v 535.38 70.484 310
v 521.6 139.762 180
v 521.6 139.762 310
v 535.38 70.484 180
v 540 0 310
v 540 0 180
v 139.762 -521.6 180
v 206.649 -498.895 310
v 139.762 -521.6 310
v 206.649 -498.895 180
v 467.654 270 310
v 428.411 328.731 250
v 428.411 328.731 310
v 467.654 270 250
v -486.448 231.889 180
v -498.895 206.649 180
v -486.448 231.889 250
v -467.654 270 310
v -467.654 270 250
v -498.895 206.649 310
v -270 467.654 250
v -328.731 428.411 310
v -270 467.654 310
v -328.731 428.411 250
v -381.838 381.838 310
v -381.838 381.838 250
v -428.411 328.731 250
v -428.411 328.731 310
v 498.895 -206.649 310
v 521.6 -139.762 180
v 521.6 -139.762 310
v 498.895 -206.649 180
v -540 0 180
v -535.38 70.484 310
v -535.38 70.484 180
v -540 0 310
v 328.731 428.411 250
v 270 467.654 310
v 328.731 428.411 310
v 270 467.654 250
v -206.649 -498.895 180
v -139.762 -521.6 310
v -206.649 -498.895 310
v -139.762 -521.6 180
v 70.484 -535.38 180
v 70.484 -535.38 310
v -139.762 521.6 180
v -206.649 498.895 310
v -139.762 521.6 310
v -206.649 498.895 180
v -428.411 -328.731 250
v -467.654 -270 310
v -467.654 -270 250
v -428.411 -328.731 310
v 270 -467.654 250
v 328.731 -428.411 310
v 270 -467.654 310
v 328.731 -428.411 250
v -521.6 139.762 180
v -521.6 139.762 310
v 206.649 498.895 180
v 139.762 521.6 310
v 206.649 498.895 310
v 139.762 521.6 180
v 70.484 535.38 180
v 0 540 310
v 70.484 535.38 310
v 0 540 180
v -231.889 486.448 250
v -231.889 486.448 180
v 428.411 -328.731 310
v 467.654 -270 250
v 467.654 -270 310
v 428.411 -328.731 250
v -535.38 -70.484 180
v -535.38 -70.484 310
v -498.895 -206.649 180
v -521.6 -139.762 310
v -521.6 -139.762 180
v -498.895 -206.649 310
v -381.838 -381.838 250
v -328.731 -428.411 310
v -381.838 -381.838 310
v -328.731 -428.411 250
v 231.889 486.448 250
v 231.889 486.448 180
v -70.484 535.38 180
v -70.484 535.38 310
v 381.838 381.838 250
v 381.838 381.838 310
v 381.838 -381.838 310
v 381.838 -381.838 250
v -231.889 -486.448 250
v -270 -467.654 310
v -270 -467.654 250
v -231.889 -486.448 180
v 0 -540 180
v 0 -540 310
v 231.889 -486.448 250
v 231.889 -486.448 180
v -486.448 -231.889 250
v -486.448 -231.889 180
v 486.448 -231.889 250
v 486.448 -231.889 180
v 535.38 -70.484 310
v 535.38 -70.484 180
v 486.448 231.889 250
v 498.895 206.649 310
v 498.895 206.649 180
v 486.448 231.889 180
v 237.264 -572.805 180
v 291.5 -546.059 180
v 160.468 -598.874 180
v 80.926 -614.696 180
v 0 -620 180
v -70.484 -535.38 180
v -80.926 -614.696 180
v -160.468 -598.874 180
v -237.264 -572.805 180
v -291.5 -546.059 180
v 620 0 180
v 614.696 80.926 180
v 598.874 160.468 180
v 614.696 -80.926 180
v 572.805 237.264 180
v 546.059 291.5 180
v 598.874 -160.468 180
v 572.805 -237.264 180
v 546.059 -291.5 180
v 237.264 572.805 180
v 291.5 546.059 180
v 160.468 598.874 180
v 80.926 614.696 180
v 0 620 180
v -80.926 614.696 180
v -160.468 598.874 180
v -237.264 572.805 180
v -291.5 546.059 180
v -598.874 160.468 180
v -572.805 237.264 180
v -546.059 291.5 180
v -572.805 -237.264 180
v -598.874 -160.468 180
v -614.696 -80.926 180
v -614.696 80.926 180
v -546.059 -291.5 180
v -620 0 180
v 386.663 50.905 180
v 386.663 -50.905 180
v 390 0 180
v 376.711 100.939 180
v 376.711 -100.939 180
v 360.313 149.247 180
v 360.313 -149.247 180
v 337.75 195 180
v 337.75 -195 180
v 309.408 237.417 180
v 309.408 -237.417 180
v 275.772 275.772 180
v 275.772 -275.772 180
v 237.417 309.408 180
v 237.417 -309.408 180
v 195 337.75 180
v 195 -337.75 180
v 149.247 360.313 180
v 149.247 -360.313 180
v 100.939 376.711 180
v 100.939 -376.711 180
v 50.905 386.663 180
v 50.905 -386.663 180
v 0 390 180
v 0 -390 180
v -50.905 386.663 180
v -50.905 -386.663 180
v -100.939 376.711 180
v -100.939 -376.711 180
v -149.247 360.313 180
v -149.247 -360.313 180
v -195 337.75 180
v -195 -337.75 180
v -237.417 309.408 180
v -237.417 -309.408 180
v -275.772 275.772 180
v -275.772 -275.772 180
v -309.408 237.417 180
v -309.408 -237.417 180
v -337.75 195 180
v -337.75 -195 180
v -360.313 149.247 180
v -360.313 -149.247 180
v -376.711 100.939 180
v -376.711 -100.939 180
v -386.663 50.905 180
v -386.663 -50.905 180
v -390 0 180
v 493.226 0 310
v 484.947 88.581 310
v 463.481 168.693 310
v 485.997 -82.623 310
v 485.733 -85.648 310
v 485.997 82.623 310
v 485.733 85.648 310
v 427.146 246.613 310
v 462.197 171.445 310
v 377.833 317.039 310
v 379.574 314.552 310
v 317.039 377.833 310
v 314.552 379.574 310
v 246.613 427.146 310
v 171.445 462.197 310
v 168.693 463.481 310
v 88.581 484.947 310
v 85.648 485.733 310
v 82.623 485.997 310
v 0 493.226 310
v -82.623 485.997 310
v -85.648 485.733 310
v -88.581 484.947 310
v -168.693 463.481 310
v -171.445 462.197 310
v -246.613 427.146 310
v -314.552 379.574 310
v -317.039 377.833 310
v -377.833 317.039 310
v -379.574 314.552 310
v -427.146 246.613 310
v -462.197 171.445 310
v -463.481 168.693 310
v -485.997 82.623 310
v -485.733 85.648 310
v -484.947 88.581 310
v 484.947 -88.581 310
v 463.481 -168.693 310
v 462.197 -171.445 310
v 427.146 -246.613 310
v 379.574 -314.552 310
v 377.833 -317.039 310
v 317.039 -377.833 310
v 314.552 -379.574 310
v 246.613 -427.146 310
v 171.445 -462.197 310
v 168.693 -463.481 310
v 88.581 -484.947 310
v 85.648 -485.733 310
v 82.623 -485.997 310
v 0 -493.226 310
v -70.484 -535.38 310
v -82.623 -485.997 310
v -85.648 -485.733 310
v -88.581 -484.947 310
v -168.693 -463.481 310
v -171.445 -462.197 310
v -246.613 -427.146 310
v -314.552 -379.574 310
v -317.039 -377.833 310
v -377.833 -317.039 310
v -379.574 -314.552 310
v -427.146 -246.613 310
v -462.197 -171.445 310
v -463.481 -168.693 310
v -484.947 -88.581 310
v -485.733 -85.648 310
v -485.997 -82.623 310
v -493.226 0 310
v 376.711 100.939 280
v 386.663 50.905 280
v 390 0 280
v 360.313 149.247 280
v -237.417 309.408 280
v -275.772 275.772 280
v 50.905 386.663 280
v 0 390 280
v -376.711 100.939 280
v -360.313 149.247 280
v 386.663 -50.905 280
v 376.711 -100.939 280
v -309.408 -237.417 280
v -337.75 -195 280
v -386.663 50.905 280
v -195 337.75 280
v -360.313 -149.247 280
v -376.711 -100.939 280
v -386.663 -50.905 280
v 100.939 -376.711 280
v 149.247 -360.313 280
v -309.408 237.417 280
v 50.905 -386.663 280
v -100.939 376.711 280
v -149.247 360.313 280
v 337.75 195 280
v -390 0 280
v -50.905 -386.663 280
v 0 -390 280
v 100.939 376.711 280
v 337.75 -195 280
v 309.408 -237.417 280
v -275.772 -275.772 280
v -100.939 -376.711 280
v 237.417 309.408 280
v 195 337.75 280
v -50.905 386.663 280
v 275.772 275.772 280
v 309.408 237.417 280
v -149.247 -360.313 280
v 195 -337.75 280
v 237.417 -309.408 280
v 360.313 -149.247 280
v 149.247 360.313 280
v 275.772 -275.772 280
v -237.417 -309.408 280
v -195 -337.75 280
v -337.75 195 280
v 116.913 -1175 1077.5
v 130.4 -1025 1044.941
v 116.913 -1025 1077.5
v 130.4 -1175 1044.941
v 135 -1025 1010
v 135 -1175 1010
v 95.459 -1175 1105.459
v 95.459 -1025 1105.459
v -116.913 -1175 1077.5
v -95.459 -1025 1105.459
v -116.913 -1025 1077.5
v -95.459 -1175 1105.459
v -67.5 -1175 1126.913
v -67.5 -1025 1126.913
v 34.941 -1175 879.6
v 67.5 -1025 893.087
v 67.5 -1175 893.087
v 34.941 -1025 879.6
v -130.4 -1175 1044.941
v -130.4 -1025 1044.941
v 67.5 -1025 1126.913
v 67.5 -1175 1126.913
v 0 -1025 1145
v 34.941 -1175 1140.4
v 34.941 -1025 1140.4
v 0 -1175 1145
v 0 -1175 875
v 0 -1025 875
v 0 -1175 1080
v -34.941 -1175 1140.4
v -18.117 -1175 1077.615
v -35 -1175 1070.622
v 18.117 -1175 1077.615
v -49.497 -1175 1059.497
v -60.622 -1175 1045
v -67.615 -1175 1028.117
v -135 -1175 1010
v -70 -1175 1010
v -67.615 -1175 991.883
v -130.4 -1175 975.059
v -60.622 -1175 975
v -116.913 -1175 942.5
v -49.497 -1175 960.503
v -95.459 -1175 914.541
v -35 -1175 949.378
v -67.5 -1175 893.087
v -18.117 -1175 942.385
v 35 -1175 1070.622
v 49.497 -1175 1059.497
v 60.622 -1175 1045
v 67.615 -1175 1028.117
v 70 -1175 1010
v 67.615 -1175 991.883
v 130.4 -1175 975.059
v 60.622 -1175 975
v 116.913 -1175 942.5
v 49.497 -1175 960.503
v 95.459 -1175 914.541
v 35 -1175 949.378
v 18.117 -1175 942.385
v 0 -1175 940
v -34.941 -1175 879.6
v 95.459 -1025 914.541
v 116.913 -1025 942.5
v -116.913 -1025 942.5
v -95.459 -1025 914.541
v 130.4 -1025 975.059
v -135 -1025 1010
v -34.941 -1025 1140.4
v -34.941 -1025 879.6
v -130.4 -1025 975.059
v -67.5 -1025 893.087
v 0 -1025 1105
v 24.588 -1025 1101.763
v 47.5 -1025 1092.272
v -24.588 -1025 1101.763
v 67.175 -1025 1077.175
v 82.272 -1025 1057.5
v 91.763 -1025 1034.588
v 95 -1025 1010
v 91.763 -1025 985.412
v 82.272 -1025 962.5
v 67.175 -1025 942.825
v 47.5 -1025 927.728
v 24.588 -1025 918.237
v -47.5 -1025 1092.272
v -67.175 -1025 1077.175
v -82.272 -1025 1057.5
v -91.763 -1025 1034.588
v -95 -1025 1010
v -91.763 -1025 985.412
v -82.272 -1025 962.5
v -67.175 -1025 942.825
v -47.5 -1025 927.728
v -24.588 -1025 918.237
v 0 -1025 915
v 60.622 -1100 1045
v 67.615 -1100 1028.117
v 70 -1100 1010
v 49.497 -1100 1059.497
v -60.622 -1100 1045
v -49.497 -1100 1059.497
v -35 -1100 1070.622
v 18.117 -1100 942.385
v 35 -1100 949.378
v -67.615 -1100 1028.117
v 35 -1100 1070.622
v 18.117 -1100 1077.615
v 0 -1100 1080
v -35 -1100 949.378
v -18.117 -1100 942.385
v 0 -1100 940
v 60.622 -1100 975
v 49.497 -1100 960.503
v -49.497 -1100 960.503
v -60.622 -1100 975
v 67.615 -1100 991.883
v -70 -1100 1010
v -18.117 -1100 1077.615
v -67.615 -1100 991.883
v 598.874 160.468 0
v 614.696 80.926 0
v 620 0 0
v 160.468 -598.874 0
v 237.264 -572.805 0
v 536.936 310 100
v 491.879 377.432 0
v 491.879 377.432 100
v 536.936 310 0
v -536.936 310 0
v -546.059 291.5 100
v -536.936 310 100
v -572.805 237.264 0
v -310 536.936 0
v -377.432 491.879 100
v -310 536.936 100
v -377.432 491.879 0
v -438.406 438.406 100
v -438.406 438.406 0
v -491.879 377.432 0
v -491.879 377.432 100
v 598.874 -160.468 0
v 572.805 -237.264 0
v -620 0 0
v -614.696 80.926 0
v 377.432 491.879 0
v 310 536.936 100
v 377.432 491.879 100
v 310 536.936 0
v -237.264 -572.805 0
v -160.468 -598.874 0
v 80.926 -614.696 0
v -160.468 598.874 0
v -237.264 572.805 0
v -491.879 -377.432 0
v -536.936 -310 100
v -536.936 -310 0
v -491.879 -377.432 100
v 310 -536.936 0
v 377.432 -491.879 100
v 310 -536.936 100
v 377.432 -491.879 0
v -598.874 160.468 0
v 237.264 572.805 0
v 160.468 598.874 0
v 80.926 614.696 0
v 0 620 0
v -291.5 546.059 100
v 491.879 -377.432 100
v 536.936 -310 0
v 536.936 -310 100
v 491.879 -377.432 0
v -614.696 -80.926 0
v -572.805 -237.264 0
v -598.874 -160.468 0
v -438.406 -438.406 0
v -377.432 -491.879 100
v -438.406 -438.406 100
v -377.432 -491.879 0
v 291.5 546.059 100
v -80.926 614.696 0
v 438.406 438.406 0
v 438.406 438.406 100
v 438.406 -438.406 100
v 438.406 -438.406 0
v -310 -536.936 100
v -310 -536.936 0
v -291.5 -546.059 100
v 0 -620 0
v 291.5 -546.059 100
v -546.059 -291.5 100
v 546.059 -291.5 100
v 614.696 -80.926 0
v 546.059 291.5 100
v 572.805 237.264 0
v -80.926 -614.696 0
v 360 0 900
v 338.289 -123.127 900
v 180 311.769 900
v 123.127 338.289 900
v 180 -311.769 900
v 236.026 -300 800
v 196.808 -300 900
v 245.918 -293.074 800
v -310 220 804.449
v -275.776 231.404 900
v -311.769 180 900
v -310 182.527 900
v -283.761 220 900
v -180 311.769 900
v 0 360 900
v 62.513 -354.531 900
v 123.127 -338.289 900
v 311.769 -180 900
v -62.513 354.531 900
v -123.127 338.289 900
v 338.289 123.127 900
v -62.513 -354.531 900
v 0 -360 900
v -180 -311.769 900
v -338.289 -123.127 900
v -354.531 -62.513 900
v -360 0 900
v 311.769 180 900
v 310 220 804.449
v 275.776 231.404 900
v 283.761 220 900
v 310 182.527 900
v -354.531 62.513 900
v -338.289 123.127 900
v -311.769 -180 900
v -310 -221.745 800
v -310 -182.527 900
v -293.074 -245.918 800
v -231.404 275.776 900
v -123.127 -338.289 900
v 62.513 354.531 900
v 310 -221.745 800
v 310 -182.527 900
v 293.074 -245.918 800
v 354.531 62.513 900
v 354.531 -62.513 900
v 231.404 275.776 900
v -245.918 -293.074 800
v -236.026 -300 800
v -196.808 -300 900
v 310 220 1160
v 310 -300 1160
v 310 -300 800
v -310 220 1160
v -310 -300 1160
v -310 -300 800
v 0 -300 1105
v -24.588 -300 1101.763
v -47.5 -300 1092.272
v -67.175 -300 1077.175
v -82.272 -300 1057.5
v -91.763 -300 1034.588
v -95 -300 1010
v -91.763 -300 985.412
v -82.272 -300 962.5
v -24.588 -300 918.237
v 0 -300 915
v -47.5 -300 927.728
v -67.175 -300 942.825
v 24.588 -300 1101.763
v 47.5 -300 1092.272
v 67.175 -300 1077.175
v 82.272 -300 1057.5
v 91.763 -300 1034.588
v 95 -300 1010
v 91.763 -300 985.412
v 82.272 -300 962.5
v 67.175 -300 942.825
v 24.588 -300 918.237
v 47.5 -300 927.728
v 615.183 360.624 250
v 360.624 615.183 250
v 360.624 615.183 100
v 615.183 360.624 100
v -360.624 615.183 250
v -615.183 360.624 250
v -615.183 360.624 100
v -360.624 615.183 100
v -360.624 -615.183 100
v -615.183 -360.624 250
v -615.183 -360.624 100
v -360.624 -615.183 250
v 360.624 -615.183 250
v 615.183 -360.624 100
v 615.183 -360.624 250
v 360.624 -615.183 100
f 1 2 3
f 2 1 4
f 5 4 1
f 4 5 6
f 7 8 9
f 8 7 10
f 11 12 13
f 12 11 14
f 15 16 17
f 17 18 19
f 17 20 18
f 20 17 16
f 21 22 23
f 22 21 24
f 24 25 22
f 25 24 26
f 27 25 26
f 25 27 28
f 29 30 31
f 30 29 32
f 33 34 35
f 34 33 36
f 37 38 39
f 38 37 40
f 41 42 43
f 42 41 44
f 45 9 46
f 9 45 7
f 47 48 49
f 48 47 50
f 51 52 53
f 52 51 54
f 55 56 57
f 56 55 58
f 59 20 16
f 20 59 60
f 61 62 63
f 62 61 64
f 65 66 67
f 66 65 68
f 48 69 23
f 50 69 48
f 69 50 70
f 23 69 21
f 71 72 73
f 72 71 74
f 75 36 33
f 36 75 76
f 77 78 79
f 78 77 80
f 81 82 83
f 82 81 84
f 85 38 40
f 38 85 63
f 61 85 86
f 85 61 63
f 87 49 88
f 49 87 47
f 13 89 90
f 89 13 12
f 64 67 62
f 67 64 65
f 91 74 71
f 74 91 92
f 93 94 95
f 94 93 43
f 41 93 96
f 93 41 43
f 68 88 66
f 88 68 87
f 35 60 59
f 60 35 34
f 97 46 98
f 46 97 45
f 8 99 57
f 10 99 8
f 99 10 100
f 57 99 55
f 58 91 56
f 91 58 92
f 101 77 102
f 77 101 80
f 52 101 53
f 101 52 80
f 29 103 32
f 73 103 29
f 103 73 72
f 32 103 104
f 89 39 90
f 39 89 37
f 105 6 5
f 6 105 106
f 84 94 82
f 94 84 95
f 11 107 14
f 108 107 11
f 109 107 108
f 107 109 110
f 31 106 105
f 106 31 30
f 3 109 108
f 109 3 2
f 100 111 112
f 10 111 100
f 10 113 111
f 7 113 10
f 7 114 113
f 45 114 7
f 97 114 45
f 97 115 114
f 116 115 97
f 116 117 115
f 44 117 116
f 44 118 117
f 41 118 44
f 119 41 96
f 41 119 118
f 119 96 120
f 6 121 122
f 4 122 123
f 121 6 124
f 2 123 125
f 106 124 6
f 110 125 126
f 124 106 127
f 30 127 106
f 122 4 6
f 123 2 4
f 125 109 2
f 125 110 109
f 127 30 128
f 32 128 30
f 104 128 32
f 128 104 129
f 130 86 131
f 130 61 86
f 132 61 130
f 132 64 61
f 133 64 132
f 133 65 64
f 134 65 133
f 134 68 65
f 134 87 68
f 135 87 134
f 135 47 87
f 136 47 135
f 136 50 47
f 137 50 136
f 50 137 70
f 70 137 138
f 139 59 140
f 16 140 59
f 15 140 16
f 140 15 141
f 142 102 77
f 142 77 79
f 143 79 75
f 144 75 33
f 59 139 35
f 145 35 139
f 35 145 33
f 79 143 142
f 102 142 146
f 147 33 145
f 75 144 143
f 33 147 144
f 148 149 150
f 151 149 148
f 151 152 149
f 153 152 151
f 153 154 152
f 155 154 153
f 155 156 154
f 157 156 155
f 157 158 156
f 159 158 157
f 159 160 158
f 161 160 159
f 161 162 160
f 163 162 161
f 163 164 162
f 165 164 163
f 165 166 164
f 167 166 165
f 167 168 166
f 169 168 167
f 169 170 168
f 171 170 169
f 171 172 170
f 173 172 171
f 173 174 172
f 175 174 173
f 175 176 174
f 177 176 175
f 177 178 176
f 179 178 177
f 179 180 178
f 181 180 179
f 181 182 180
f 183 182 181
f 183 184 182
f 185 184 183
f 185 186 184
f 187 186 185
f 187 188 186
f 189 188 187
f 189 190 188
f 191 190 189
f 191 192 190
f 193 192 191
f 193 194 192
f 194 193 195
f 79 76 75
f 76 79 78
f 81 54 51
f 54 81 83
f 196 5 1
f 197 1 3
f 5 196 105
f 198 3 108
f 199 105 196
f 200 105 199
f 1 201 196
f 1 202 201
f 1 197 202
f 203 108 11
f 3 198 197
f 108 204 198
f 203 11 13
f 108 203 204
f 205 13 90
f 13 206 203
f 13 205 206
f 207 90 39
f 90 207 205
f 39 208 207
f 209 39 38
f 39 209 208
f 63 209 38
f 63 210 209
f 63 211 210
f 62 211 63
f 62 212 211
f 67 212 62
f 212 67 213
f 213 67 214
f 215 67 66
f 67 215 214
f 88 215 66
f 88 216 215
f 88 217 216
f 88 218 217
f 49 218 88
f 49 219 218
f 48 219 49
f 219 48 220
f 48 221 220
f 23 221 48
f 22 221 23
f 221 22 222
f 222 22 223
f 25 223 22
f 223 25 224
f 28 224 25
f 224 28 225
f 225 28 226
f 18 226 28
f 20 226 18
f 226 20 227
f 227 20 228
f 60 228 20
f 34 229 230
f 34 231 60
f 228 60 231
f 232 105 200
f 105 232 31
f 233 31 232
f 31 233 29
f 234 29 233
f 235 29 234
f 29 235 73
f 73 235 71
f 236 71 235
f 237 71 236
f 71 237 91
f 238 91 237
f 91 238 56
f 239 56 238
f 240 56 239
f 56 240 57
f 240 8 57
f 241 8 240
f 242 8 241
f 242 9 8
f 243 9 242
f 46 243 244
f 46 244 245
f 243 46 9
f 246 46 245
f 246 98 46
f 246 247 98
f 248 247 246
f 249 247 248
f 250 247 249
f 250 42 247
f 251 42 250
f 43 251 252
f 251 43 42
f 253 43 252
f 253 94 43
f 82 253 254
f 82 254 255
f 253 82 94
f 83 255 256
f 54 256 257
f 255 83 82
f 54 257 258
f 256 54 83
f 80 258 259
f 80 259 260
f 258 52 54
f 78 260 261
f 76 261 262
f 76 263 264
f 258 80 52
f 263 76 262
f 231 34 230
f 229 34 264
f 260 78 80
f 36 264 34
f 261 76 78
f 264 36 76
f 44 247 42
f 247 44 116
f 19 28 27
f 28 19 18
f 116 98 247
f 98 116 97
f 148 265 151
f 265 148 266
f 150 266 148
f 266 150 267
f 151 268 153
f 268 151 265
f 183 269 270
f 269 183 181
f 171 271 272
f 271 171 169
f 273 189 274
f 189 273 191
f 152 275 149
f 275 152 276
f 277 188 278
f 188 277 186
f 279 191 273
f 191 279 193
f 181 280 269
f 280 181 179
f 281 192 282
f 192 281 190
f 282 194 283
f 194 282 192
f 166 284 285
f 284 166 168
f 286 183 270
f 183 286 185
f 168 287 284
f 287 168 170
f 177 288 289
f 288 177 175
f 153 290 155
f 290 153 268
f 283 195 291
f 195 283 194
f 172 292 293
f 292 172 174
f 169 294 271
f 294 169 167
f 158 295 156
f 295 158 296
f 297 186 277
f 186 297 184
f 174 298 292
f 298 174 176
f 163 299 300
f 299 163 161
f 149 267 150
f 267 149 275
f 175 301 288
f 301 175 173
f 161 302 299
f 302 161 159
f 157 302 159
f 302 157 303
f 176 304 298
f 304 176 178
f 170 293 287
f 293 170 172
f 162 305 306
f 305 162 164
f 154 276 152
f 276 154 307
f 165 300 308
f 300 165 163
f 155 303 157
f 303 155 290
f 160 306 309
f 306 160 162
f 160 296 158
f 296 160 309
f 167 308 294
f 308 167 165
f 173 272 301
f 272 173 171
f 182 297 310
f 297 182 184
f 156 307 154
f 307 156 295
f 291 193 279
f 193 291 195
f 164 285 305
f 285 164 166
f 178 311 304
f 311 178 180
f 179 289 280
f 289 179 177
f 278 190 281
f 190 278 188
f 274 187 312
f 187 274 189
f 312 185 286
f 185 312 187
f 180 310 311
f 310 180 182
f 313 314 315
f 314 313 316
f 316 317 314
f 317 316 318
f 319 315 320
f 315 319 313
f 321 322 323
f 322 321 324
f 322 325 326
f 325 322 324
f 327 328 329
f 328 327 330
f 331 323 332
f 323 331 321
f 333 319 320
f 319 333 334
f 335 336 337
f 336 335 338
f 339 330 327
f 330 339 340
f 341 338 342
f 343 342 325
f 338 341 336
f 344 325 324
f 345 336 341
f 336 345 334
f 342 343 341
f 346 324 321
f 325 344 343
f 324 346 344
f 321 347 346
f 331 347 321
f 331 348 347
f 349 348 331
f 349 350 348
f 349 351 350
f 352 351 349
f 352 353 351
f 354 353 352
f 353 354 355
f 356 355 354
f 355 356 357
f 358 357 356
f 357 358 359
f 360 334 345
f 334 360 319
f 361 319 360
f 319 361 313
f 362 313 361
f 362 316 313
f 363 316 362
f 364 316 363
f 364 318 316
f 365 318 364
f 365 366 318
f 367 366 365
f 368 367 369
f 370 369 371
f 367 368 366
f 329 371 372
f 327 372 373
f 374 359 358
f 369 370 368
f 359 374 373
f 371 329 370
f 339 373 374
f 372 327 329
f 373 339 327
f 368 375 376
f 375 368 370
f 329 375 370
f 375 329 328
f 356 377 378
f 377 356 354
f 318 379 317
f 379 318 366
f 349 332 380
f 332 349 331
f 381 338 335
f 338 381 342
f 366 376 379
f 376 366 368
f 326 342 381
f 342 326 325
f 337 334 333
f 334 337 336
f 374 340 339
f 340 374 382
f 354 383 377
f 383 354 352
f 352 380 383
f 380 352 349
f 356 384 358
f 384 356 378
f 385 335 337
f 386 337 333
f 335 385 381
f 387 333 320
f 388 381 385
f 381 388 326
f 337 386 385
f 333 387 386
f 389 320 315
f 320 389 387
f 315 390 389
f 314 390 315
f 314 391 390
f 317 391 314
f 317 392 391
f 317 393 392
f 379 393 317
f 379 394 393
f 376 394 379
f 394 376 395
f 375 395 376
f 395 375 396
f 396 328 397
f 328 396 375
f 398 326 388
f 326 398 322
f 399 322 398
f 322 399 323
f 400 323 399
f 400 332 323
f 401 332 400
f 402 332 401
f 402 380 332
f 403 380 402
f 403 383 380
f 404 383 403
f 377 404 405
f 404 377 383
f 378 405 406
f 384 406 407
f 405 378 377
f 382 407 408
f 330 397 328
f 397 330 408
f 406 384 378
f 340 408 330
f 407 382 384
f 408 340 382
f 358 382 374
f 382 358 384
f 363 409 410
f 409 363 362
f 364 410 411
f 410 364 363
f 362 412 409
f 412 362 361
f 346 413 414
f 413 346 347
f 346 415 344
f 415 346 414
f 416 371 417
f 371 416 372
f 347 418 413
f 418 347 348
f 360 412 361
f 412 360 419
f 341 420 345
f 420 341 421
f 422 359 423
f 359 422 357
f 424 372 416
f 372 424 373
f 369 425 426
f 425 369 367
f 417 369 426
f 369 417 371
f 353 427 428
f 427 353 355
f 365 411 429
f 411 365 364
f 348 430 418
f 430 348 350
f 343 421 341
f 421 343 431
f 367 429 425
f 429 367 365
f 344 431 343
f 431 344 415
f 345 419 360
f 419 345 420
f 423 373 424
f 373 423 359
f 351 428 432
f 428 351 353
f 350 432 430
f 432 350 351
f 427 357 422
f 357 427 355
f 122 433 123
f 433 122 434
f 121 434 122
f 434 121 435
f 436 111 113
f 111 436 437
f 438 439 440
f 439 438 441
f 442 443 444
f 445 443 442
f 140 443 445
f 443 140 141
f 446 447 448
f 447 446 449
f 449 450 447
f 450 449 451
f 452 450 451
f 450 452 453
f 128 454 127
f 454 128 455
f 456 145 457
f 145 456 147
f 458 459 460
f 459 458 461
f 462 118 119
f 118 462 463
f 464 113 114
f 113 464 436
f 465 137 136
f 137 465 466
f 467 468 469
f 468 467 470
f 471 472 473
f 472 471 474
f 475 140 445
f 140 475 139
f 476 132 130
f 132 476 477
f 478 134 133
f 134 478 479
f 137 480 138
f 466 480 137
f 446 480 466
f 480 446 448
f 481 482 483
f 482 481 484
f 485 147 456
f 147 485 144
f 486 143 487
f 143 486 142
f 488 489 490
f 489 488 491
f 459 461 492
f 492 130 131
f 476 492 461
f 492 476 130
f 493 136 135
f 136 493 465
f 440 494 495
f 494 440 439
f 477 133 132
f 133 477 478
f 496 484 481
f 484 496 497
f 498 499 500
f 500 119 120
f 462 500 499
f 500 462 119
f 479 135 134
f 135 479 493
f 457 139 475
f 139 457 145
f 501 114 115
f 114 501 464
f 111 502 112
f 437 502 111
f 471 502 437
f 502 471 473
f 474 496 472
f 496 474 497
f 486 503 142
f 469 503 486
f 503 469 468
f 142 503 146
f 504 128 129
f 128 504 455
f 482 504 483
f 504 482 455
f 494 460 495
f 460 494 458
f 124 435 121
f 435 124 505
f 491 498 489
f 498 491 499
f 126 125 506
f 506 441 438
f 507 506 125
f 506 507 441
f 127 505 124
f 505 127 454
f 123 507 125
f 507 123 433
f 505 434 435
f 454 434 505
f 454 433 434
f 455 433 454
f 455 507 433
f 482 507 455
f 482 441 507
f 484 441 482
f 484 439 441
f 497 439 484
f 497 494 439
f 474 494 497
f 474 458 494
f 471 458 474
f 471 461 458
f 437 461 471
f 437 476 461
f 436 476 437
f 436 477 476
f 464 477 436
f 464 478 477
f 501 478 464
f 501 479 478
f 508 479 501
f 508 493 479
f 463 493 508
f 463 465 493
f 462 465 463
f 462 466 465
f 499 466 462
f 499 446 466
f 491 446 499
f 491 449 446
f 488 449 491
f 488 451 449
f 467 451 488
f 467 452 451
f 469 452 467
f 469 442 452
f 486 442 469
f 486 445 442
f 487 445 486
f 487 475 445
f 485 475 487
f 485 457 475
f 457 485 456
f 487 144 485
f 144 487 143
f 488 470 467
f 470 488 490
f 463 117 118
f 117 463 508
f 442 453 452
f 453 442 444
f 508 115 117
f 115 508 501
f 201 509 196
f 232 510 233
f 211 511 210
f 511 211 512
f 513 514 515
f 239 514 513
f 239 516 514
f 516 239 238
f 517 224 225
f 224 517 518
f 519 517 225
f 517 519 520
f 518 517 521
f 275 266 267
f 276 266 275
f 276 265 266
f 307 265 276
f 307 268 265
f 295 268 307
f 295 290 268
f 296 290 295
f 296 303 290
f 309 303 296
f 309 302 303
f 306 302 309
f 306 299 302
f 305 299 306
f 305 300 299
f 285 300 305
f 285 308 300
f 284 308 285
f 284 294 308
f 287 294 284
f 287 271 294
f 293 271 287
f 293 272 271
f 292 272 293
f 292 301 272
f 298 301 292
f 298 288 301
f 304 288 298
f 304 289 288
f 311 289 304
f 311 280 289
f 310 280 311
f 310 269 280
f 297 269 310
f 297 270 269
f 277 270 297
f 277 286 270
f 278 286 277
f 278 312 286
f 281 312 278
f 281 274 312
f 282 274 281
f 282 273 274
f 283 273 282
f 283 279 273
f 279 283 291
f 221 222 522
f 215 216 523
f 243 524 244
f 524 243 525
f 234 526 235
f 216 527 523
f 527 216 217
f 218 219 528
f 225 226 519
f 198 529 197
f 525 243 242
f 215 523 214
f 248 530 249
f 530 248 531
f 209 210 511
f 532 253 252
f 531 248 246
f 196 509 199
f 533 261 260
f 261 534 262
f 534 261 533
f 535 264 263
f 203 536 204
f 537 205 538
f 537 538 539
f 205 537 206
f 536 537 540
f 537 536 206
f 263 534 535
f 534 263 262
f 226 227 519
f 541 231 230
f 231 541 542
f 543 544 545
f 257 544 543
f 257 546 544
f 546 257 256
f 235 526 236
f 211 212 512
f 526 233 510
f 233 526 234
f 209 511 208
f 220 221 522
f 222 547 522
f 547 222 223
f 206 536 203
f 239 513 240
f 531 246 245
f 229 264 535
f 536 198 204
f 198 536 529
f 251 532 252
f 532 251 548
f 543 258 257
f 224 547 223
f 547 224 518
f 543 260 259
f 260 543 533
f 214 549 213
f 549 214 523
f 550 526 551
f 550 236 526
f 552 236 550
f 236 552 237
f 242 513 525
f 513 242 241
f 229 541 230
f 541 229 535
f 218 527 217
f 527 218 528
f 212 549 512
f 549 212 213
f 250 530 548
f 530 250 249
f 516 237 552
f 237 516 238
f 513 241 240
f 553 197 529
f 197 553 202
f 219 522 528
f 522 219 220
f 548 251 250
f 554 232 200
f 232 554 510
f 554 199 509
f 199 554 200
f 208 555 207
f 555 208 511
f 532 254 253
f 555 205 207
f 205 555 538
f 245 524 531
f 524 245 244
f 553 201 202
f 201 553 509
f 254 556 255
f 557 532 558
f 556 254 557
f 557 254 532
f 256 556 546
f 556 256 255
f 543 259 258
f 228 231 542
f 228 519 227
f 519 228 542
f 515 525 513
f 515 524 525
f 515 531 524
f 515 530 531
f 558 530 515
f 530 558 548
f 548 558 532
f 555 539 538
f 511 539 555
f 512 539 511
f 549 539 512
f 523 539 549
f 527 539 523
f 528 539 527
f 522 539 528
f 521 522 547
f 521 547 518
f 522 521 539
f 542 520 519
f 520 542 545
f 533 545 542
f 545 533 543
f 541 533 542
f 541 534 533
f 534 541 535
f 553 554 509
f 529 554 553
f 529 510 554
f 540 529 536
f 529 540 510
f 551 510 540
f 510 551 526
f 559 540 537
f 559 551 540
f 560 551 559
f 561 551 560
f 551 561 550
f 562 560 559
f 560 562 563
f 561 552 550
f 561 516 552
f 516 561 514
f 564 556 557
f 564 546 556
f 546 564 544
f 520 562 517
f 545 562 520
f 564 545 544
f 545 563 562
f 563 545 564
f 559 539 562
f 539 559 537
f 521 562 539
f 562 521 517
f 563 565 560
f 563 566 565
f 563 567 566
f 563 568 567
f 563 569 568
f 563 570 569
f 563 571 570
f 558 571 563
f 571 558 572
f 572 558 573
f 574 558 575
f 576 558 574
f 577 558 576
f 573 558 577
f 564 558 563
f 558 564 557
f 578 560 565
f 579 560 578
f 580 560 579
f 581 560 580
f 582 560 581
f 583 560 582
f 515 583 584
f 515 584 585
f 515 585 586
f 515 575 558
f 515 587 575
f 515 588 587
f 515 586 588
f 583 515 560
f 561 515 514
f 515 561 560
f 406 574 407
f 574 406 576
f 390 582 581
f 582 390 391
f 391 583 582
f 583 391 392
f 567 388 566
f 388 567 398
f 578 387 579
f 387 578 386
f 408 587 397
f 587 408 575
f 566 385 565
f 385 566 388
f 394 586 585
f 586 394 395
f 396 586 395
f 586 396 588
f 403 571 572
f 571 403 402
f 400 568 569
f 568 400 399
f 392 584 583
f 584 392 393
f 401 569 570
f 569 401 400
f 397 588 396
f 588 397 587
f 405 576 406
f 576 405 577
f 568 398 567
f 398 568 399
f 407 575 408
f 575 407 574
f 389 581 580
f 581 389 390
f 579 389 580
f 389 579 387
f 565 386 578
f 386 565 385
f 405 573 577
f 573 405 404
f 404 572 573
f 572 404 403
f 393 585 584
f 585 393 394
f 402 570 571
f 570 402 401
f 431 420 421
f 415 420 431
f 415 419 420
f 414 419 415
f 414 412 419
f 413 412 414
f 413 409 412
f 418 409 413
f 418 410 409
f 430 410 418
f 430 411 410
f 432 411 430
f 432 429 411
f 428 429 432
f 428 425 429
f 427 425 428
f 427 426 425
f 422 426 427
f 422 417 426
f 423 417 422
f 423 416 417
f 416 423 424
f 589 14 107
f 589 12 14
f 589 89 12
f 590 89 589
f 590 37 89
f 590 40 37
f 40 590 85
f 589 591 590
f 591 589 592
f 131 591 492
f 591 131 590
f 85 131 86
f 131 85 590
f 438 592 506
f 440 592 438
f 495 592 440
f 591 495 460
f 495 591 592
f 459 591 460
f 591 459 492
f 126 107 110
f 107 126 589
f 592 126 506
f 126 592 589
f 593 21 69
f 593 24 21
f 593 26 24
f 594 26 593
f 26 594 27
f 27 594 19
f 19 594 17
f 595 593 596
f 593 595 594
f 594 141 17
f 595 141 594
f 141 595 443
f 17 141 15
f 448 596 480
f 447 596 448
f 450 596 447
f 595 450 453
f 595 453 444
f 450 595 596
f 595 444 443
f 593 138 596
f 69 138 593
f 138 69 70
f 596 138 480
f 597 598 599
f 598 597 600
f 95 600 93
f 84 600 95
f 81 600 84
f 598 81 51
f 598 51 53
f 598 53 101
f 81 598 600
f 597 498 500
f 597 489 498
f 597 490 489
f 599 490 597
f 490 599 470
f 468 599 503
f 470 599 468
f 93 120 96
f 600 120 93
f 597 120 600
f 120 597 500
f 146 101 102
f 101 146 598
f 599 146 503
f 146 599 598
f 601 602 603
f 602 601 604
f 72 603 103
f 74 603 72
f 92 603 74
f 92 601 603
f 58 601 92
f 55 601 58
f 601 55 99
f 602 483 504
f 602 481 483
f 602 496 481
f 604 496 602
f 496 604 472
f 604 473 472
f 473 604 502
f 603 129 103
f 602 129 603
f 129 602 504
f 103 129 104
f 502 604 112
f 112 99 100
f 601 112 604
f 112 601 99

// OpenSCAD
// Generated by AXM Machine Geometry Foundry 0.4.0
// Asset: AXM-TURRET-001 AXM Compact Defense Turret v0.4.0
// Units: millimetres; source orientation: +Z up, -Y forward.
// Canonical source is recipe.json. This is an editable generated bridge.

// instance: base | base: base | print_group: base
color([0.09412, 0.11373, 0.15294, 1.00000])
translate([0, 0, 90]) rotate([0, 0, 0]) scale([1, 1, 1]) cylinder(h=180, r=620, center=true, $fn=48);

// instance: rotation_ring | base: rotation_ring | print_group: rotation_ring
color([0.13725, 0.80392, 0.92157, 1.00000])
translate([0, 0, 245]) rotate([0, 0, 0]) scale([1, 1, 1]) difference() { cylinder(h=130, r=540, center=true, $fn=48); cylinder(h=130.02, r=390, center=true, $fn=48); }

// instance: body | base: body | print_group: body
color([0.17647, 0.22745, 0.29804, 1.00000])
translate([0, 0, 590]) rotate([0, 0, 0]) scale([1, 1, 1]) cylinder(h=620, r1=500, r2=360, center=true, $fn=36);

// instance: head | base: head | print_group: head
color([0.17647, 0.22745, 0.29804, 1.00000])
translate([0, -40, 980]) rotate([0, 0, 0]) scale([1, 1, 1]) cube([620, 520, 360], center=true);

// instance: barrel | base: barrel | print_group: barrel
color([0.13725, 0.80392, 0.92157, 1.00000])
translate([0, -650, 1010]) rotate([90, 0, 0]) scale([1, 1, 1]) cylinder(h=900, r=95, center=true, $fn=24);

// instance: muzzle | base: muzzle | print_group: muzzle
color([1.00000, 0.67451, 0.14510, 1.00000])
translate([0, -1100, 1010]) rotate([90, 0, 0]) scale([1, 1, 1]) difference() { cylinder(h=150, r=135, center=true, $fn=24); cylinder(h=150.02, r=70, center=true, $fn=24); }

// instance: stabilizer__r00 | base: stabilizer | print_group: stabilizer
color([0.17647, 0.22745, 0.29804, 1.00000])
translate([395.9798, 395.9798, 175]) rotate([0, 0, 45]) scale([1, 1, 1]) cube([260, 360, 150], center=true);

// instance: stabilizer__r01 | base: stabilizer | print_group: stabilizer
color([0.17647, 0.22745, 0.29804, 1.00000])
translate([-395.9798, 395.9798, 175]) rotate([0, 0, 135]) scale([1, 1, 1]) cube([260, 360, 150], center=true);

// instance: stabilizer__r02 | base: stabilizer | print_group: stabilizer
color([0.17647, 0.22745, 0.29804, 1.00000])
translate([-395.9798, -395.9798, 175]) rotate([0, 0, 225]) scale([1, 1, 1]) cube([260, 360, 150], center=true);

// instance: stabilizer__r03 | base: stabilizer | print_group: stabilizer
color([0.17647, 0.22745, 0.29804, 1.00000])
translate([395.9798, -395.9798, 175]) rotate([0, 0, 315]) scale([1, 1, 1]) cube([260, 360, 150], center=true);
